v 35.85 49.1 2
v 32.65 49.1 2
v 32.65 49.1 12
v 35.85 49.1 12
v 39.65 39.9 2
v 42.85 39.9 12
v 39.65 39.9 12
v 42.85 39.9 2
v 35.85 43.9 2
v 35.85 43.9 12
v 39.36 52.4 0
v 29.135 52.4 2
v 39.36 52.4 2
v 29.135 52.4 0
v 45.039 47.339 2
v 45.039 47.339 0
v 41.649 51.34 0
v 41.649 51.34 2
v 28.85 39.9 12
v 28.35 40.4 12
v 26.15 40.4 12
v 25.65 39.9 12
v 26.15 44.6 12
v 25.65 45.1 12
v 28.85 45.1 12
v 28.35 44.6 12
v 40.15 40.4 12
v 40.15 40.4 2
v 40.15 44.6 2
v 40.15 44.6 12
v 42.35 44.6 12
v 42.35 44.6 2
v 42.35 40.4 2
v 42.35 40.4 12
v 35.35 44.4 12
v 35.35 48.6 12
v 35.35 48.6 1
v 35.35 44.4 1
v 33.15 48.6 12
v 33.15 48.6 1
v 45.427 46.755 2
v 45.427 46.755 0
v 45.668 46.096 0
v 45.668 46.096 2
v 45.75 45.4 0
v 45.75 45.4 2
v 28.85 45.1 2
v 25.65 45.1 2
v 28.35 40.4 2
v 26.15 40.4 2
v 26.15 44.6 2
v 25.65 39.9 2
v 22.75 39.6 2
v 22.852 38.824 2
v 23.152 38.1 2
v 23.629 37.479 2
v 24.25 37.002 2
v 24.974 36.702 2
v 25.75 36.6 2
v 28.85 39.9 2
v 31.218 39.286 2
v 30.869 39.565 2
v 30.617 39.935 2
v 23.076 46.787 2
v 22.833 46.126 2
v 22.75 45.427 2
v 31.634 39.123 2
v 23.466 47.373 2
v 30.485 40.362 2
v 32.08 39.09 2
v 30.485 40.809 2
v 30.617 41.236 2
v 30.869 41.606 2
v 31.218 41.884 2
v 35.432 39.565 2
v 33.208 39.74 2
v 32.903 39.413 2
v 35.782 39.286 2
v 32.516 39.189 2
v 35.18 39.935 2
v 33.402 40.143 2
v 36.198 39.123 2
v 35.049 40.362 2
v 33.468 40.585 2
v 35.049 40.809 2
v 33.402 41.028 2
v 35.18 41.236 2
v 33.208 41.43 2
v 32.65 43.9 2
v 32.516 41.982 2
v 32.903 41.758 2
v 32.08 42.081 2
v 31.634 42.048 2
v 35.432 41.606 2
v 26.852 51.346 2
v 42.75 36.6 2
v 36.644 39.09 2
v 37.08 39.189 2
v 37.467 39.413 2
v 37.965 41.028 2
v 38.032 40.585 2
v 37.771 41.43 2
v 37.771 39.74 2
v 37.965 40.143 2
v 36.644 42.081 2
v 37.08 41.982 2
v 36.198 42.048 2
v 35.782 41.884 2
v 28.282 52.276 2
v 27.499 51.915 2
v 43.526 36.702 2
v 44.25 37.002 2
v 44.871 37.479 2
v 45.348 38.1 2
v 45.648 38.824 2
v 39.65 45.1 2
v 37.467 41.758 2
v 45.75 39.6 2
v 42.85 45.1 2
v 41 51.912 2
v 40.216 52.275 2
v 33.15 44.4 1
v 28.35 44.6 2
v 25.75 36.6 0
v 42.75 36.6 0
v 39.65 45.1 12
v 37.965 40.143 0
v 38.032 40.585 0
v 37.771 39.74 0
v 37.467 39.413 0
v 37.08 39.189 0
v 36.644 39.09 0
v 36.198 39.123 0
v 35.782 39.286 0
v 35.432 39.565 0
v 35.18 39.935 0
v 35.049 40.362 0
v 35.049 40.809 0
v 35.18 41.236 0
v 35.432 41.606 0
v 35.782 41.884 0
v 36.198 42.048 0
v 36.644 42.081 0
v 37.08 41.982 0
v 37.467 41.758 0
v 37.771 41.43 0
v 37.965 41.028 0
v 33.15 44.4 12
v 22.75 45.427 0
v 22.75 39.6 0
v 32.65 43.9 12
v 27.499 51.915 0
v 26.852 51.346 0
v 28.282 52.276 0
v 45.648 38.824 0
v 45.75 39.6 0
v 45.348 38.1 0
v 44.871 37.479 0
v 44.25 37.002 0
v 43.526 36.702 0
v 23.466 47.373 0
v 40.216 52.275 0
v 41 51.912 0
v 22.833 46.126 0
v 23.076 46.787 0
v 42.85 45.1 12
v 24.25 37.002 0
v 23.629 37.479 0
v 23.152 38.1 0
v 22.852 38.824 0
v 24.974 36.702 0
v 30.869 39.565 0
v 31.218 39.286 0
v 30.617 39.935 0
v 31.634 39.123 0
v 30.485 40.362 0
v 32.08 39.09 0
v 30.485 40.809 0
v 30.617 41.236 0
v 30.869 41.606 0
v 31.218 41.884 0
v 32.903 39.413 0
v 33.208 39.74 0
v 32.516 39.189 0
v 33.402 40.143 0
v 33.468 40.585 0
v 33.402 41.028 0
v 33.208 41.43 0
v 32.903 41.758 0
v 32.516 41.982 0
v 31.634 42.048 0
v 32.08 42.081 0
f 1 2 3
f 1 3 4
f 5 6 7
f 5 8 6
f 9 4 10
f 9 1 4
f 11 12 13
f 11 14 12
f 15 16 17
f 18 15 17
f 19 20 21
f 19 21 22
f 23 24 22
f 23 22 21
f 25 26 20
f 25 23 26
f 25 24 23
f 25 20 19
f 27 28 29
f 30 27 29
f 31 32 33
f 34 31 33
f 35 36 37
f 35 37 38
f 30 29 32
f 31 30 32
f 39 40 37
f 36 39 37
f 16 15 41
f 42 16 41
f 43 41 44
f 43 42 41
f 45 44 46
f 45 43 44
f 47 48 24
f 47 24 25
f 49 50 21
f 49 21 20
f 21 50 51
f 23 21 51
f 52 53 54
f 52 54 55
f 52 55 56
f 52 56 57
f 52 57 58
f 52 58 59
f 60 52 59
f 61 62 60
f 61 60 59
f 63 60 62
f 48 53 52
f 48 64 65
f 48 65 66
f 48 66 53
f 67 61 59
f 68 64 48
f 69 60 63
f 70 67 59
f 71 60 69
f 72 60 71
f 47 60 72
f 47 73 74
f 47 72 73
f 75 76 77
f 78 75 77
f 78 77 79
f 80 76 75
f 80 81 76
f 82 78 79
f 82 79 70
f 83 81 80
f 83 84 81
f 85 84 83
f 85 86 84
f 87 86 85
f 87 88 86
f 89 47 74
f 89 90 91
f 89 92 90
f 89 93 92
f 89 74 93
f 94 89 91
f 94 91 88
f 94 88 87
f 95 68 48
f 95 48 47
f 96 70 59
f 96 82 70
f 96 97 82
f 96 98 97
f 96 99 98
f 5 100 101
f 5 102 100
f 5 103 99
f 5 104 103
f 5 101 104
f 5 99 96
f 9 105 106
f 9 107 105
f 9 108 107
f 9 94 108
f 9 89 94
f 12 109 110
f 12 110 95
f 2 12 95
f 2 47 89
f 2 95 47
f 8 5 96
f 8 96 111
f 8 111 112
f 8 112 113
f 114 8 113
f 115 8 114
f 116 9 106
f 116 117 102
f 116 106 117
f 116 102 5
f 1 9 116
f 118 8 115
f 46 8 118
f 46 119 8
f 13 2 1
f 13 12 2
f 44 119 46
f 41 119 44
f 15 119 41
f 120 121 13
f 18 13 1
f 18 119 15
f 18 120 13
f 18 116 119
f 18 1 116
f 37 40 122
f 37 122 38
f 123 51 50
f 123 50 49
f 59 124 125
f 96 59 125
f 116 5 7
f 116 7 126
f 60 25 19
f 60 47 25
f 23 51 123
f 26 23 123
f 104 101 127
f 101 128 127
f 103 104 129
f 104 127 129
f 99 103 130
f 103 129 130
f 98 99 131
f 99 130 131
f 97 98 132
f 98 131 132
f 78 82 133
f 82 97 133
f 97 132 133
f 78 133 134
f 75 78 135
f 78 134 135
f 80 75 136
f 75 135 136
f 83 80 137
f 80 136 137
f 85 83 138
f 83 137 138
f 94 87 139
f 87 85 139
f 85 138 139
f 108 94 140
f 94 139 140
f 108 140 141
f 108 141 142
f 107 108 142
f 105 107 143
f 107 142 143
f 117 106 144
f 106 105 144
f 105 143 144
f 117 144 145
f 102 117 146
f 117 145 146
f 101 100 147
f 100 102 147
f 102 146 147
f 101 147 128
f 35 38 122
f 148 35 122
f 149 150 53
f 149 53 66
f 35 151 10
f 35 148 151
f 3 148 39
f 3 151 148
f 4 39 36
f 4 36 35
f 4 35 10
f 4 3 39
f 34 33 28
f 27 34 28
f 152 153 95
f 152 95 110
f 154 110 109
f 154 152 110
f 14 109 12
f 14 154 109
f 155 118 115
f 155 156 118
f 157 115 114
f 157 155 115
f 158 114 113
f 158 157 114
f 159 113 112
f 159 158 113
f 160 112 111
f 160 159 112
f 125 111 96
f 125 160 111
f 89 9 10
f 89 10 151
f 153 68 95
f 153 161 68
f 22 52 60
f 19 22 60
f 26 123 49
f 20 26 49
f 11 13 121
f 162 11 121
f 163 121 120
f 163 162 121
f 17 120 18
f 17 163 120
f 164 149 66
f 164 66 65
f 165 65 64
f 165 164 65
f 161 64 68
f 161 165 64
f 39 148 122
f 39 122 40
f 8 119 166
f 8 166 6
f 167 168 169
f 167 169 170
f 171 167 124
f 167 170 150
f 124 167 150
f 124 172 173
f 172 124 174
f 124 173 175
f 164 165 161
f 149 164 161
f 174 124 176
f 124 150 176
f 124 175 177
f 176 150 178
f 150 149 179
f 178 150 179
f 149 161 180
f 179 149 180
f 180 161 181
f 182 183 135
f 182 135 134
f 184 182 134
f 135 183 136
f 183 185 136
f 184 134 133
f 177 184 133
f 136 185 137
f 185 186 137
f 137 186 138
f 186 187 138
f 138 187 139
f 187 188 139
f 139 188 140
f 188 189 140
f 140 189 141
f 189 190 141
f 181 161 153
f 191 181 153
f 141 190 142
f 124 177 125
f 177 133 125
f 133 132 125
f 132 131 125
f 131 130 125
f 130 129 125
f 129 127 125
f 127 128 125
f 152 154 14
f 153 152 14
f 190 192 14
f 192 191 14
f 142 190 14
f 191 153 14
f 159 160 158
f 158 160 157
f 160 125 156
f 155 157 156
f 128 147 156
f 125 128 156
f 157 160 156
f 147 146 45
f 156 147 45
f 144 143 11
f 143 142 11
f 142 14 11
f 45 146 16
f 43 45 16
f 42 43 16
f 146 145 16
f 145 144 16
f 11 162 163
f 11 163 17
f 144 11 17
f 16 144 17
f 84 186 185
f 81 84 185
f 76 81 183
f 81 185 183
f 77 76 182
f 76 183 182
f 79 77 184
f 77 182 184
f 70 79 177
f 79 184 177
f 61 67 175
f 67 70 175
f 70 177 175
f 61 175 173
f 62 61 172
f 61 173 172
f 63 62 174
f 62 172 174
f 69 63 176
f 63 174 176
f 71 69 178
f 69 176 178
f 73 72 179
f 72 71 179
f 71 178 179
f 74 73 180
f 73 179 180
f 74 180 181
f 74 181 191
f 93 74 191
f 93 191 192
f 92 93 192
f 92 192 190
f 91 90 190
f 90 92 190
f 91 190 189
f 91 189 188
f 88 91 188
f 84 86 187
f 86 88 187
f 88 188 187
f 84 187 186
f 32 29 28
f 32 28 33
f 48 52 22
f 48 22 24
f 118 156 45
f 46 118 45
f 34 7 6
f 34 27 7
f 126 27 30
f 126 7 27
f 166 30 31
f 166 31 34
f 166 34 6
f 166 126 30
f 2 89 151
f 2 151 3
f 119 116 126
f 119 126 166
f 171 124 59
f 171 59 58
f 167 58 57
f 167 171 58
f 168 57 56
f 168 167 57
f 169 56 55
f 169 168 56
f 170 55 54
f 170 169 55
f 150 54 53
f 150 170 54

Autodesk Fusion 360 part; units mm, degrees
sketch "Sketch1" plane through (0, 0, 0) normal (0, 0, 1) x (1, 0, 0)
  line L0 (25.75, 36.6) -> (42.75, 36.6)
  line L1 (40.15, 44.6) -> (42.35, 44.6)
  line L2 (42.35, 44.6) -> (42.35, 40.4)
  line L3 (42.35, 40.4) -> (40.15, 40.4)
  line L4 (40.15, 40.4) -> (40.15, 44.6)
  line L5 (26.15, 40.4) -> (26.15, 44.6)
  line L6 (28.35, 44.6) -> (28.35, 40.4)
  line L7 (26.15, 44.6) -> (28.35, 44.6)
  line L8 (26.15, 40.4) -> (28.35, 40.4)
  line L9 (33.15, 48.6) -> (35.35, 48.6)
  line L10 (35.35, 48.6) -> (35.35, 44.4)
  line L11 (35.35, 44.4) -> (33.15, 44.4)
  line L12 (33.15, 44.4) -> (33.15, 48.6)
  line L13 (29.1351, 52.4) -> (39.36, 52.4)
  line L14 (22.75, 39.6) -> (22.75, 45.4272)
  line L15 (45.75, 39.6) -> (45.75, 45.3997)
  arc A0 (22.75, 39.6) -> (25.75, 36.6) centre (25.75, 39.6) ccw
  arc A1 (42.75, 36.6) -> (45.75, 39.6) centre (42.75, 39.6) ccw
  circle A2 centre (36.5318, 40.5854) radius 1.5
  circle A3 centre (31.9682, 40.5854) radius 1.5
  line L16 (23.4665, 47.3729) -> (26.8517, 51.3457)
  line L17 (45.0387, 47.3393) -> (41.6487, 51.3396)
  arc A4 (23.4665, 47.3729) -> (22.75, 45.4272) centre (25.75, 45.4272) ccw
  arc A5 (29.1351, 52.4) -> (26.8517, 51.3457) centre (29.1351, 49.4) ccw
  arc A6 (41.6487, 51.3396) -> (39.36, 52.4) centre (39.36, 49.4) ccw
  arc A7 (45.75, 45.3997) -> (45.0387, 47.3393) centre (42.75, 45.3997) ccw
  line L18 (28.85, 45.1) -> (28.85, 39.9)
  line L19 (25.65, 39.9) -> (28.85, 39.9)
  line L20 (25.65, 39.9) -> (25.65, 45.1)
  line L21 (25.65, 45.1) -> (28.85, 45.1)
  line L22 (35.85, 49.1) -> (35.85, 43.9)
  line L23 (35.85, 43.9) -> (32.65, 43.9)
  line L24 (32.65, 43.9) -> (32.65, 49.1)
  line L25 (32.65, 49.1) -> (35.85, 49.1)
  line L26 (42.85, 45.1) -> (42.85, 39.9)
  line L27 (42.85, 39.9) -> (39.65, 39.9)
  line L28 (39.65, 39.9) -> (39.65, 45.1)
  line L29 (39.65, 45.1) -> (42.85, 45.1)
  point P0 (22.75, 36.6)
  point P1 (45.75, 36.6)
  point P2 (27.75, 52.4)
  point P3 (40.75, 52.4)
  dimension "d1" = 23
  dimension "d22" = 13
  dimension "d29" = 3
  dimension "d31" = 3
  dimension "d32" = 3
  dimension "d34" = 3
  dimension "d35" = -0.5
  dimension "d36" = -0.5
  dimension "d37" = -0.5
extrude "Extrude1" add sketch "Sketch1" along normal blind 2 makes body 1 at (26.8833, 41.8, 0) makes body 2 at (33.8833, 47.2, 0) makes body 3 at (29.4506, 48.5152, 0) makes body 4 at (40.8833, 41.8, 0)
extrude "Extrude2" add sketch "Sketch1" along normal blind 11 contours L18 L19 L20 L21 | L22 L23 L24 L25 | L26 L27 L28 L29 bodies 1 2 3 4
extrude "Extrude5" add 1 faces at (25.8167, 43.2, 11) along direction (0, 0, 1) blind 1 on bodies 1 bodies 1
extrude "Extrude6" add 1 faces at (32.8167, 47.2, 11) along direction (0, 0, 1) blind 1 on bodies 1 bodies 1
extrude "Extrude7" add 1 faces at (42.6833, 41.8, 11) along direction (0, 0, 1) blind 1 on bodies 1 bodies 1
extrude "Extrude10" cut 1 faces at (33.8833, 47.2, 2) along direction (0, 0, -1) blind 1 on bodies 1 bodies 1
extrude "Extrude8" [suppressed]
extrude "Extrude3" [suppressed]
